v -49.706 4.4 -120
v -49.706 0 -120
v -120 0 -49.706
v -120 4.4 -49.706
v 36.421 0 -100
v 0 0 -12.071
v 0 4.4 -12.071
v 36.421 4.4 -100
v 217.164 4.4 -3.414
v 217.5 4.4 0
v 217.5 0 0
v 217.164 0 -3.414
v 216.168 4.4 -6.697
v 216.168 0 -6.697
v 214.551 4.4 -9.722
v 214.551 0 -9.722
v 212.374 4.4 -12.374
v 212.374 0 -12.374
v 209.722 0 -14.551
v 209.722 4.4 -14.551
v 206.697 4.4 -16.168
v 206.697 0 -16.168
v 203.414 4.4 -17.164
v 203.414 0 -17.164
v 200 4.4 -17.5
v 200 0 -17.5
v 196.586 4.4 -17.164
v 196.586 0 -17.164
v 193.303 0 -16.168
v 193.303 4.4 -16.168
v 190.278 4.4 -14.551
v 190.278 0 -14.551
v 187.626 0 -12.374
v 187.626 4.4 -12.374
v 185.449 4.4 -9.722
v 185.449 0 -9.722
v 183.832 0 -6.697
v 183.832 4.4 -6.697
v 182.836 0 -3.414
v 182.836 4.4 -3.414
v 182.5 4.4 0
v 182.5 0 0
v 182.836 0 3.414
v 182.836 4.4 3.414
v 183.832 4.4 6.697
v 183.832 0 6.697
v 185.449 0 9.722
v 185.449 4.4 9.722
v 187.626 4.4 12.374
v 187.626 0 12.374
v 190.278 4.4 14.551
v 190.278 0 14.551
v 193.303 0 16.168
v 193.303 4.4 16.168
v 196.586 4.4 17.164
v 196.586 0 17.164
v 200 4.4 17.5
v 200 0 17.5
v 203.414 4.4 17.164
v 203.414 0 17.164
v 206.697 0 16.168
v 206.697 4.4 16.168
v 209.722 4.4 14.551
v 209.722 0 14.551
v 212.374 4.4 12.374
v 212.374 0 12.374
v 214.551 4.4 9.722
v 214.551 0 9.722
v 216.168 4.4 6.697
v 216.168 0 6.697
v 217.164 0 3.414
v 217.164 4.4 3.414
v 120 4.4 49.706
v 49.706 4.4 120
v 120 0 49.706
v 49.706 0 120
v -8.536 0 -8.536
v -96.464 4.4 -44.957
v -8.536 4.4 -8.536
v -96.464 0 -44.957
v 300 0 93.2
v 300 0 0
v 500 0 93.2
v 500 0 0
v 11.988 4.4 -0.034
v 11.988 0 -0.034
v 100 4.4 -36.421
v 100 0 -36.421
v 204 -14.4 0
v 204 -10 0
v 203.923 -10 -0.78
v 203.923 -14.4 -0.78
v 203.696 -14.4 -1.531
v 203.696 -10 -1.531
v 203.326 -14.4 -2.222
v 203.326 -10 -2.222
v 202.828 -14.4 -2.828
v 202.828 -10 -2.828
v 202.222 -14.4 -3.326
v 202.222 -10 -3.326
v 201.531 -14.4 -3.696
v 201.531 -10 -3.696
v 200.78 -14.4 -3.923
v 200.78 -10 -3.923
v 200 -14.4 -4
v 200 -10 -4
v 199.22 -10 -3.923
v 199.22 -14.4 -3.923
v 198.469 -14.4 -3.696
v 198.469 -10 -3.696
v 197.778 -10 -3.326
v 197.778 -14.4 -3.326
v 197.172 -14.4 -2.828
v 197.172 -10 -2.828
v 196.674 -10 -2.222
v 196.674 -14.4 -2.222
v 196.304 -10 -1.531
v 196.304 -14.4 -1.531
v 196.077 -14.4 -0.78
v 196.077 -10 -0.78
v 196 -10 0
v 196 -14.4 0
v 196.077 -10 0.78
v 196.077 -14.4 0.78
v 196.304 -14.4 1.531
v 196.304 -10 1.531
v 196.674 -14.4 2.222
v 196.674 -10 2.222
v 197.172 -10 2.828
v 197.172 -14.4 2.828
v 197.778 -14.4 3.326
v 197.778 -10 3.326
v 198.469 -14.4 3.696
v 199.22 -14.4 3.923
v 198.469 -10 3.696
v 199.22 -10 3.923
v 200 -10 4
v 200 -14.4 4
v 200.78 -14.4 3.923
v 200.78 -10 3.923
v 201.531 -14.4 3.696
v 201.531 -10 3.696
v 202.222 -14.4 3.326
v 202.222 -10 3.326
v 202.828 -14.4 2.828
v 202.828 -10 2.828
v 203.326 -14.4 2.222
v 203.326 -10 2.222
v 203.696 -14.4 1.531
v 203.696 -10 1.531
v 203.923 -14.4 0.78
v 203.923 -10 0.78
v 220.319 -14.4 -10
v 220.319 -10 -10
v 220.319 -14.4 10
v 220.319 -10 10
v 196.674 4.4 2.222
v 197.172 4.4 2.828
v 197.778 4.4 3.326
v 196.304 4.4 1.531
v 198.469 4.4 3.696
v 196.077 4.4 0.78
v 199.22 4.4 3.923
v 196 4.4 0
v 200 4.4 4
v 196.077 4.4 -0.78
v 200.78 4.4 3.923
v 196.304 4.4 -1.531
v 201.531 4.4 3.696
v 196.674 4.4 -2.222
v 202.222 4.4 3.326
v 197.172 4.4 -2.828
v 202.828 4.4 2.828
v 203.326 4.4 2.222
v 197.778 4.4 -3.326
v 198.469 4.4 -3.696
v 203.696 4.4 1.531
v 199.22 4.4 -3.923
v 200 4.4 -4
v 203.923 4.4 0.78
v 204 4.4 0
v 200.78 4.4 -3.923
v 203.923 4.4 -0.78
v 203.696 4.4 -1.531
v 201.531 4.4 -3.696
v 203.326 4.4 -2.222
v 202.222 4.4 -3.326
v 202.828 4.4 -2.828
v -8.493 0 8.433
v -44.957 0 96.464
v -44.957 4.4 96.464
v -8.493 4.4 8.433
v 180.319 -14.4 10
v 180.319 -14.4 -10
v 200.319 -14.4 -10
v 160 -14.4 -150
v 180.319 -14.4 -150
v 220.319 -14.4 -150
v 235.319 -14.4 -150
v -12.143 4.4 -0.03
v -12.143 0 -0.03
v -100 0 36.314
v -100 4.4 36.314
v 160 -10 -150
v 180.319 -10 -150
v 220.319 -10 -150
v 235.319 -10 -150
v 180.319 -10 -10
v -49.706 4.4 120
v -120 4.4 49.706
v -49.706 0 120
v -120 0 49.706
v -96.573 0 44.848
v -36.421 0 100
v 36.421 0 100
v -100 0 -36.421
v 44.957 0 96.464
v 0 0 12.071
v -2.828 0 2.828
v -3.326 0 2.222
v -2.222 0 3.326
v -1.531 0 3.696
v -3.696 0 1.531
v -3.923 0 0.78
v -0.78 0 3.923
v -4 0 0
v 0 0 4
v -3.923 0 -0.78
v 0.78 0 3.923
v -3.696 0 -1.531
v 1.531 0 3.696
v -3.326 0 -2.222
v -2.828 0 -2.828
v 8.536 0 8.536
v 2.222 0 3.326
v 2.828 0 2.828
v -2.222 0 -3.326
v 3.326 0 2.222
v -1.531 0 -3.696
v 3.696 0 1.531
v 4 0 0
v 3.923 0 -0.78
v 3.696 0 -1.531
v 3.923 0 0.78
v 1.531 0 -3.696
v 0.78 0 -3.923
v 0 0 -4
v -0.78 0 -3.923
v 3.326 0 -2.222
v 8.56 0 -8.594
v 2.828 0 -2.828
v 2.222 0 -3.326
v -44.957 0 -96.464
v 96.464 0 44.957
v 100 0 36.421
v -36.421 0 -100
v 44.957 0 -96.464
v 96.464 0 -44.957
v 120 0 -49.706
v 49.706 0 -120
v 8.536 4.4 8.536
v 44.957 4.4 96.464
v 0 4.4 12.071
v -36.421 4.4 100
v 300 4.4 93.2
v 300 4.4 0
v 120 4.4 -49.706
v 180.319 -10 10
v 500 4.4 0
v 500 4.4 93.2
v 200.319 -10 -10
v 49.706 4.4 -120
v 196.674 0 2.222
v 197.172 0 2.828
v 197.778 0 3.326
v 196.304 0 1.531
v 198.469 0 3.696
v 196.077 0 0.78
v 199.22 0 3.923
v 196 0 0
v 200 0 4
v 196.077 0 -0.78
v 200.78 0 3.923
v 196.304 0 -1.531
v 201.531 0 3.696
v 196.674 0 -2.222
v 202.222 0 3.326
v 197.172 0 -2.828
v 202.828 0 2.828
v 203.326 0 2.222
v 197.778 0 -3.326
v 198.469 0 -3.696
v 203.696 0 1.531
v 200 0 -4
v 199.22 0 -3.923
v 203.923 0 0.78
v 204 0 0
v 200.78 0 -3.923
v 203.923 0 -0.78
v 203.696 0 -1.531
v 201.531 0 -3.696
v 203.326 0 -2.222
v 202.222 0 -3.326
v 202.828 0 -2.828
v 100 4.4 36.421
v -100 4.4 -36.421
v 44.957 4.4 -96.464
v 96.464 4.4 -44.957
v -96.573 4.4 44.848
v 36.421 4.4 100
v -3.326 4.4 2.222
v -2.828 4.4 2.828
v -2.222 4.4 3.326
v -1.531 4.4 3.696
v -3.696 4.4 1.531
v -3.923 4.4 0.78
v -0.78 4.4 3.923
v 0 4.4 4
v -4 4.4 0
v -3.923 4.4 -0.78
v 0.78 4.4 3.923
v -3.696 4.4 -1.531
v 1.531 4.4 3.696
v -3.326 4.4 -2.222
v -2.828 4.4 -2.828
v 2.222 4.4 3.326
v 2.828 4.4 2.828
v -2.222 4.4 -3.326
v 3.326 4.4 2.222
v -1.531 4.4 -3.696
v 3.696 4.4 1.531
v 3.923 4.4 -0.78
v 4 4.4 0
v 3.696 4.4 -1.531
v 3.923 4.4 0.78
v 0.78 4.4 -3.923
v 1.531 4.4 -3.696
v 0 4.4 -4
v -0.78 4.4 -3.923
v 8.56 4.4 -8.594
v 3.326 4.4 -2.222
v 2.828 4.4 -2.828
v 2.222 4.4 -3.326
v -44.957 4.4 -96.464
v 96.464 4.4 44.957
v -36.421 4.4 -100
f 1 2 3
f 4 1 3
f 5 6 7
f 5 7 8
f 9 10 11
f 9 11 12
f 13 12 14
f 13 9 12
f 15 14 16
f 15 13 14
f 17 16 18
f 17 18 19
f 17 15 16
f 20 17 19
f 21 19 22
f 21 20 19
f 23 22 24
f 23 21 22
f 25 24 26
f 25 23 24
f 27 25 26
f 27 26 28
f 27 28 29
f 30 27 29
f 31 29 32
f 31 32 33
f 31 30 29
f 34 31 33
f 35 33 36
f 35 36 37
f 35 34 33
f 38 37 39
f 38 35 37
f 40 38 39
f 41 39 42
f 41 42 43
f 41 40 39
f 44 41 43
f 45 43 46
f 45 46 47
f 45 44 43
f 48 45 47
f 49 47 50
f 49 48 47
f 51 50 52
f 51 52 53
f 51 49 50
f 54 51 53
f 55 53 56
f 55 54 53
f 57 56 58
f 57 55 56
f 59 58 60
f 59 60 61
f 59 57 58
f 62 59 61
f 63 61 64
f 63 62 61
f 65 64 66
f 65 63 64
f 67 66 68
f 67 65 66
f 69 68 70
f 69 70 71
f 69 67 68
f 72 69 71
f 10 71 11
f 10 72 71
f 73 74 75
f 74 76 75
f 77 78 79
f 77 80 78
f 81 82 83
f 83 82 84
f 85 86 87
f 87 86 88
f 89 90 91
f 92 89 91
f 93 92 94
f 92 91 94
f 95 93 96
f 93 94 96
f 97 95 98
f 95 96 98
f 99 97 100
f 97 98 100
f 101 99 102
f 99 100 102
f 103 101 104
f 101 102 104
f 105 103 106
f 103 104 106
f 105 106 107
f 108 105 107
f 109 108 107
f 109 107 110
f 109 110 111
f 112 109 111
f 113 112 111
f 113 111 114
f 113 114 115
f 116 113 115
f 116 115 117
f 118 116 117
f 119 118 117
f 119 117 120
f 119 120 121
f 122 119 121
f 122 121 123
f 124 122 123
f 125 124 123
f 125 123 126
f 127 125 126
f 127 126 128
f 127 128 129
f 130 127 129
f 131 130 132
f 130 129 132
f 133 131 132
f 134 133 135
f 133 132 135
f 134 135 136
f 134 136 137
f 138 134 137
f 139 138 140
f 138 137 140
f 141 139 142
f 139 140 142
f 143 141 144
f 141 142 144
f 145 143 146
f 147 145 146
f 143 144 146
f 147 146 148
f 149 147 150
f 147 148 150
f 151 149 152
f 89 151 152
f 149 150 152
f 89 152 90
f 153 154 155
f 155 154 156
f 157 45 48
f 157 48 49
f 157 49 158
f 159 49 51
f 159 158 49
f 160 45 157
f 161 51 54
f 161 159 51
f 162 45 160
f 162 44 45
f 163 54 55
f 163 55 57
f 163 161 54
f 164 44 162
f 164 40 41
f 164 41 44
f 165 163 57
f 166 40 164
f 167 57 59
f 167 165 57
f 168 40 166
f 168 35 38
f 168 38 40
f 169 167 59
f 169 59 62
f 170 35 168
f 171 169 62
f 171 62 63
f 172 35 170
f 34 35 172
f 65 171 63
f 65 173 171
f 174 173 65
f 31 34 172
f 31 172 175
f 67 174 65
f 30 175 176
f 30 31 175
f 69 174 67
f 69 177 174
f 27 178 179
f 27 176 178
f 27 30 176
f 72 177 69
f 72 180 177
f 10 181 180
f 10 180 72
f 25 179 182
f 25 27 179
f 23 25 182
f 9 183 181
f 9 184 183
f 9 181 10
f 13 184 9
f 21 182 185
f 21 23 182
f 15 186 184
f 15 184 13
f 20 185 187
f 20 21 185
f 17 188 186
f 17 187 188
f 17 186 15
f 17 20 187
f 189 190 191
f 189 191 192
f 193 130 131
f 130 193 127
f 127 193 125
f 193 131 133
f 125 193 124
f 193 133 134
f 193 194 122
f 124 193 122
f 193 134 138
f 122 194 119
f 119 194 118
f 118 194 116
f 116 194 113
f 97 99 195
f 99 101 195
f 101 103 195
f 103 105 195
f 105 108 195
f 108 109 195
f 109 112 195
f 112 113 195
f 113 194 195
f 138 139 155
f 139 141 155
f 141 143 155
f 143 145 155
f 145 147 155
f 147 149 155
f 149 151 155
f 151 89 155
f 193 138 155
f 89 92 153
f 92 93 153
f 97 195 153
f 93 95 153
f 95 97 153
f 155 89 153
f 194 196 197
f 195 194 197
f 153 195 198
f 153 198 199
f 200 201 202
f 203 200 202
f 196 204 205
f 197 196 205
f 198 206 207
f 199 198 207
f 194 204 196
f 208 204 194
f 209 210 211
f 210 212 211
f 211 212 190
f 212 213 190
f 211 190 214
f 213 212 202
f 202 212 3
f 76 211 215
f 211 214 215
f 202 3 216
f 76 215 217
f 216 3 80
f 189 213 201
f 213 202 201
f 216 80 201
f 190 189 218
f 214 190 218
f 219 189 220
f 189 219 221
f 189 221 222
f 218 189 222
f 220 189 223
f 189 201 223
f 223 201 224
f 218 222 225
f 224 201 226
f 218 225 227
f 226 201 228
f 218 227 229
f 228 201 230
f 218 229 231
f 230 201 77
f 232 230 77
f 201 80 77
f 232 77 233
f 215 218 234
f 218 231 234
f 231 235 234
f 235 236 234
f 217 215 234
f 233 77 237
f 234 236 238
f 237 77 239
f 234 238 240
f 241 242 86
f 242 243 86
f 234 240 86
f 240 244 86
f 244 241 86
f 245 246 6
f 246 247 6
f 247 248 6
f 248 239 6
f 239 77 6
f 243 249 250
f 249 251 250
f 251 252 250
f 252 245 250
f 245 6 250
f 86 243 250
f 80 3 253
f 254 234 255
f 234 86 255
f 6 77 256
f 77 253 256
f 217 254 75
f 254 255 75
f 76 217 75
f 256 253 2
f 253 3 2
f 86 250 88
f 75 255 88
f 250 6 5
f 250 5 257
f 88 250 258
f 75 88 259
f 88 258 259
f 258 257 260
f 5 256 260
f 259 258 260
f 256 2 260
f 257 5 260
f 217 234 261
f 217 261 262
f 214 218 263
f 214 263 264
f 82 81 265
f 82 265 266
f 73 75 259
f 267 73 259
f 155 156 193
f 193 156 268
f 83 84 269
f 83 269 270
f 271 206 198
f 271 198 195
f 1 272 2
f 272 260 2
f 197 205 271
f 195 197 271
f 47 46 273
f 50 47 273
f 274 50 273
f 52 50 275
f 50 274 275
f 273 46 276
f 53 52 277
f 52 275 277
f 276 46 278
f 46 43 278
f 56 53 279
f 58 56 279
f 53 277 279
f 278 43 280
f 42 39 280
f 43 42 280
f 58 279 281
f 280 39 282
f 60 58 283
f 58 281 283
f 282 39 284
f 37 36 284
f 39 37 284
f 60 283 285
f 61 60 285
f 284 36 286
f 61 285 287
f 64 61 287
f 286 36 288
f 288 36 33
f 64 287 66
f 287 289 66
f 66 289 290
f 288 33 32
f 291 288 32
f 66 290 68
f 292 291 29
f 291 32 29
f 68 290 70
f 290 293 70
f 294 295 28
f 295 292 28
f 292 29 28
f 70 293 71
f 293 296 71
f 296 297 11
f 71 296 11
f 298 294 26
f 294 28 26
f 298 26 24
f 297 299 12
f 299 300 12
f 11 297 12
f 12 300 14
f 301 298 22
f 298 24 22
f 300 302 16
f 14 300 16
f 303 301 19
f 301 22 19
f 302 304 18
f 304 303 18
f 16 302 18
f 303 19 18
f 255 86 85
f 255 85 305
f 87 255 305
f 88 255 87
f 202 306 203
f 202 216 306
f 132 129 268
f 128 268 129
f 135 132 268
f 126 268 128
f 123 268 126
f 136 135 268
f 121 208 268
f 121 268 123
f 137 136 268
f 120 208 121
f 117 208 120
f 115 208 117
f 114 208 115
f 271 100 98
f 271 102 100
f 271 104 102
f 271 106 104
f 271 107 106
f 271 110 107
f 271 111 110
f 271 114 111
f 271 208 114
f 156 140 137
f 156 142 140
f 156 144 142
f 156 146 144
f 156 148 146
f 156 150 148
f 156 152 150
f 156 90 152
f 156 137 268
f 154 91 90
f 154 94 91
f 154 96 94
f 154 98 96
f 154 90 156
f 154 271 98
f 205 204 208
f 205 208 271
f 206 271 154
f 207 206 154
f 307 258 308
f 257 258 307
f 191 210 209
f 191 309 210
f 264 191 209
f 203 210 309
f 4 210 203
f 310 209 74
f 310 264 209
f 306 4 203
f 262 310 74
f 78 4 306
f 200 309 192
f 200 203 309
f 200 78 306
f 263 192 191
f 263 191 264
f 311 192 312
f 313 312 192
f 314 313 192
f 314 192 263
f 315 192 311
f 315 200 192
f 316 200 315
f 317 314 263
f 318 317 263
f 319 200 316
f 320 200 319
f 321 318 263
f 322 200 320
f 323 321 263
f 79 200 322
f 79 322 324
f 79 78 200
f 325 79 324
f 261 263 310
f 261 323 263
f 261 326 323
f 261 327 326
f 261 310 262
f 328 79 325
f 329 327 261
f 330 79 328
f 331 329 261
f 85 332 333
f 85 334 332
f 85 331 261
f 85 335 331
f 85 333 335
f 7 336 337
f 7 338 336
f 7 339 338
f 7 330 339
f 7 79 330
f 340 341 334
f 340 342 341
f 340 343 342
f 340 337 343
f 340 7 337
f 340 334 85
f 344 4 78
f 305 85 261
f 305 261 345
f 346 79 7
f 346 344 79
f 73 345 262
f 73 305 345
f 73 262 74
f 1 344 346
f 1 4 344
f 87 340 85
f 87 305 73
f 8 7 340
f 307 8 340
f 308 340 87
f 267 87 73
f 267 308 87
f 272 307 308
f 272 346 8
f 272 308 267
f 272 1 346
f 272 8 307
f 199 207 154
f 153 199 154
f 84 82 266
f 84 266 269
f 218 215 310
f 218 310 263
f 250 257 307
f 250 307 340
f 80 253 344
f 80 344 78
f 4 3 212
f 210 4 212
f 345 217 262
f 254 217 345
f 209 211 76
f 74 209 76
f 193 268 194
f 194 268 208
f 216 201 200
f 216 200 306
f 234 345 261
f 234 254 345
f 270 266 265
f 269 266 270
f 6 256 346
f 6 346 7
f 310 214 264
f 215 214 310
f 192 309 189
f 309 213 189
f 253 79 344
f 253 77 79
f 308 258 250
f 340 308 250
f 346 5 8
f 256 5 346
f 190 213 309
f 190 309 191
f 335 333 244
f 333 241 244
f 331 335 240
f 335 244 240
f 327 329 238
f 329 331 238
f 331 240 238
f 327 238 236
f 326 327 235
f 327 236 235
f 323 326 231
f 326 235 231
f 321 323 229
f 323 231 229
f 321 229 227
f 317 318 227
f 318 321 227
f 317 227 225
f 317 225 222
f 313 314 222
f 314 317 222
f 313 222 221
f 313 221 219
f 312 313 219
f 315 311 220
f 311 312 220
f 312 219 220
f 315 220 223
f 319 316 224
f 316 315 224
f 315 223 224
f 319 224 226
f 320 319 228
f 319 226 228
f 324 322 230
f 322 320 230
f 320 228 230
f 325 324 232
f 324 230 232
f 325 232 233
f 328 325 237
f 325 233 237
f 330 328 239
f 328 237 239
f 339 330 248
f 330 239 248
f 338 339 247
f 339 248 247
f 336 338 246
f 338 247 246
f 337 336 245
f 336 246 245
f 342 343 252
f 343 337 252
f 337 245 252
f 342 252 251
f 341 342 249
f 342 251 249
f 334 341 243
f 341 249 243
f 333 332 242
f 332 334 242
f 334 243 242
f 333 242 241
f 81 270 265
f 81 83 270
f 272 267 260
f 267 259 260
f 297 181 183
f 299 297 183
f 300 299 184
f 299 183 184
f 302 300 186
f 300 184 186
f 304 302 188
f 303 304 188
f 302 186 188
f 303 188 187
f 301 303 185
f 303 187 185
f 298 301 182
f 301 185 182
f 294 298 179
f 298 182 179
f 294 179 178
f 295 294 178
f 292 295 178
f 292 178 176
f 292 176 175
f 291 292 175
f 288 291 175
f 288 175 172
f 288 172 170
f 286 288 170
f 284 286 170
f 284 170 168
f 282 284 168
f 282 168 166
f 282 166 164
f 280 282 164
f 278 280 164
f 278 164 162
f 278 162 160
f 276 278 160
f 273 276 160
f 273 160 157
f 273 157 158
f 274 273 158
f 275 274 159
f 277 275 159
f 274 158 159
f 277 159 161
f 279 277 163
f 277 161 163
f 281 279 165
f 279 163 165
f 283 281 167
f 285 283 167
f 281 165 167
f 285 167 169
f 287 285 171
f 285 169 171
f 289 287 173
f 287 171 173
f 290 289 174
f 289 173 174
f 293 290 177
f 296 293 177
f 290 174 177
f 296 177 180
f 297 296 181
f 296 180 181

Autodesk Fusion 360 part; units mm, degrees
sketch "Sketch1" plane through (0, 0, 0) normal (0, 1, 0) x (1, 0, 0)
  line L0 (100, -41.4214) -> (100, 41.4213)
  line L1 (100, 41.4213) -> (41.4214, 100)
  line L2 (41.4214, 100) -> (-41.4213, 100)
  line L3 (-41.4213, 100) -> (-100, 41.4214)
  line L4 (-100, 41.4214) -> (-100, -41.4213)
  line L5 (-100, -41.4213) -> (-41.4214, -100)
  line L6 (-41.4214, -100) -> (41.4213, -100)
  line L7 (41.4213, -100) -> (100, -41.4214)
  line L8 (-96.5734, -44.848) -> (-100.1089, -41.3124) construction
  line L9 (-100.1089, -41.3124) -> (-100, -36.3136) construction
  line L10 (-41.4214, -100) -> (-36.4214, -100)
  line L11 (-41.4214, -100) -> (-44.9569, -96.4644)
  line L12 (-100, 41.4214) -> (-100, 36.4214)
  line L13 (-100, 41.4214) -> (-96.4644, 44.9569)
  line L14 (-41.4213, 100) -> (-36.4213, 100)
  line L15 (-41.4213, 100) -> (-44.9569, 96.4645)
  line L16 (41.4214, 100) -> (44.9569, 96.4644)
  line L17 (41.4214, 100) -> (36.4214, 100)
  line L18 (100, 41.4213) -> (100, 36.4213)
  line L19 (100, 41.4213) -> (96.4645, 44.9569)
  line L20 (100, -41.4214) -> (100, -36.4214)
  line L21 (100, -41.4214) -> (96.4644, -44.9569)
  line L22 (41.4213, -100) -> (44.9569, -96.4645)
  line L23 (41.4213, -100) -> (36.4213, -100)
  line L24 (-96.5734, -44.848) -> (100, 36.4213)
  line L25 (96.4645, 44.9569) -> (-100, -36.3136)
  line L26 (-44.9569, -96.4644) -> (36.4214, 100)
  line L27 (44.9569, 96.4644) -> (-36.4214, -100)
  line L28 (36.4213, -100) -> (-44.9569, 96.4645)
  line L29 (-36.4213, 100) -> (44.9569, -96.4645)
  line L30 (96.4644, -44.9569) -> (-100, 36.4214)
  line L31 (-96.4644, 44.9569) -> (100, -36.4214)
  circle A0 centre (0, 0) radius 4
  circle A1 centre (0, 0) radius 17.5
  line L32 (120, 49.7056) -> (49.7056, 120)
  line L33 (49.7056, 120) -> (-49.7056, 120)
  line L34 (-49.7056, 120) -> (-120, 49.7056)
  line L35 (-120, 49.7056) -> (-120, -49.7056)
  line L36 (-120, -49.7056) -> (-49.7056, -120)
  line L37 (-49.7056, -120) -> (49.7056, -120)
  line L38 (49.7056, -120) -> (120, -49.7056)
  line L39 (120, -49.7056) -> (120, 49.7056)
  line L40 (200.3187, 0) -> (200.3187, 150) construction
  line L41 (200.3187, 150) -> (220.3187, 150) construction
  line L42 (200.3187, 150) -> (180.3187, 150) construction
  line L43 (220.3187, 150) -> (235.3187, 150)
  line L44 (220.3187, -10) -> (180.3187, -10)
  line L45 (180.3187, -10) -> (180.3187, 10)
  line L46 (220.3187, 10) -> (220.3187, -10)
  line L47 (220.3187, -10) -> (180.3187, 10) construction
  line L48 (180.3187, -10) -> (220.3187, 10) construction
  line L49 (235.3187, 150) -> (220.3187, 10)
  line L50 (220.3187, 150) -> (200.3187, 10)
  line L51 (180.3187, 150) -> (200.3187, 10)
  line L52 (160, 150) -> (180.3187, 10)
  line L53 (160, 150) -> (180.3187, 150)
  line L54 (300, 0) -> (500, 0)
  line L55 (500, 0) -> (500, -93.2)
  line L56 (500, -93.2) -> (300, -93.2)
  line L57 (300, -93.2) -> (300, 0)
  point P0 (200.3187, 0)
  dimension "d5" = 100
  dimension "d6" = 5
  dimension "d7" = 5
  dimension "d10" = 5
  dimension "d11" = 5
  dimension "d12" = 5
  dimension "d13" = 5
  dimension "d14" = 5
  dimension "d15" = 5
  dimension "d16" = 5
  dimension "d17" = 5
  dimension "d18" = 5
  dimension "d19" = 5
  dimension "d20" = 5
  dimension "d21" = 5
  dimension "d22" = 5
  dimension "d23" = 5
  dimension "d25" = 8
  dimension "d26" = 35
  dimension "d28" = 120
  dimension "d42" = 150
  dimension "d43" = 20
  dimension "d44" = 20
  dimension "d45" = 15
  dimension "d46" = 40
  dimension "d47" = 20
  dimension "d48" = 200
  dimension "d49" = 93.2
extrude "Extrude1" add sketch "Sketch1" along normal blind 4.4 contours L0 L7 L20 L21 L30 L31 A1 | L0 L1 L18 L19 L24 L25 A1 | L24 L29 L30 L31 A1 | L6 L7 L22 L23 L28 L29 A1 | L24 L25 L27 L31 A1 | L24 L27 L29 L31 | L27 L28 L29 L30 A1 | L24 L27 L29 L30 | L24 L27 L29 | L25 L27 L29 L31 | L27 L29 L31 | L24 L27 L30 | L24 L27 L28 L30 | L1 L2 L16 L17 L26 L27 A1 | L25 L26 L27 L29 A1 | L24 L25 L26 L27 L28 L29 L30 L31 | L25 L29 L31 | L5 L6 L10 L11 L26 L27 A1 | L24 L26 L27 L28 A1 | L24 L28 L30 | L25 L26 L29 L31 | L25 L26 L31 | L24 L26 L28 L30 | L26 L28 L30 | L26 L28 L29 L31 A1 | L2 L3 L14 L15 L28 L29 A1 | L25 L26 L28 | L25 L26 L28 L31 | L24 L25 L26 L30 A1 | L4 L5 L24 L25 A1 | L25 L26 L28 L30 | L25 L28 L30 L31 A1 | L3 L4 L12 L13 L30 L31 A1 | L32 L33 L34 L35 L36 L37 L38 L39 makes body 1
cylinder "CylinderPrimitive1" add diameter 35 height 4.4 placed x (1, 0, 0) y (0, 0, -1) z (0, 1, 0) at (200, 0, 0) separate body makes body 2
cylinder "CylinderPrimitive2" cut diameter 8 height 5 placed x (1, 0, 0) y (0, 0, -1) z (0, 1, 0) at (200, 0, 0) bodies 2
extrude "Extrude3" add sketch "Sketch1" against normal blind 4.4 from surface at -10 separate body contours L43 L44 L45 L46 L49 L50 L51 L52 L53 makes body 3
extrude "Extrude4" add sketch "Sketch1" along normal blind 4.4 separate body contours L54 L55 L56 L57 makes body 4
cylinder "CylinderPrimitive3" cut diameter 8 height -30 placed x (1, 0, 0) y (0, 0, -1) z (0, 1, 0) at (200, 0, 0) bodies 3
copy_body "Body->Comp1" bodies 1 removing the originals makes body 5 in component "Component"
copy_body "Body->Comp2" bodies 2 removing the originals makes body 6 in component "Component'"
copy_body "Body->Comp3" bodies 3 removing the originals makes body 7 in component "Component''"
copy_body "Body->Comp4" bodies 4 removing the originals makes body 8 in component "Component'''"
component "Component" placed x (1, 0, 0) y (0, 1, 0) z (0, 0, 1) at (0, 0, 0)
component "Component'" placed x (1, 0, 0) y (0, 1, 0) z (0, 0, 1) at (0, 0, 0)
component "Component''" placed x (1, 0, 0) y (0, 1, 0) z (0, 0, 1) at (0, 0, 0)
component "Component'''" placed x (1, 0, 0) y (0, 1, 0) z (0, 0, 1) at (0, 0, 0)
equation "outside_diameter = 100 mm"
equation "number_of_sides = 8"
equation "inner_diameter = 35 mm"
equation "distance_between = 80 mm"
equation "d5 = outside_diameter"
equation "d6 = width_of_sides"
equation "d7 = width_of_sides"
equation "width_of_sides = 5 mm"
equation "d10 = width_of_sides"
equation "d11 = width_of_sides"
equation "d12 = width_of_sides"
equation "d13 = width_of_sides"
equation "d14 = width_of_sides"
equation "d15 = width_of_sides"
equation "d16 = width_of_sides"
equation "d17 = width_of_sides"
equation "d18 = width_of_sides"
equation "d19 = width_of_sides"
equation "d20 = width_of_sides"
equation "d21 = width_of_sides"
equation "d22 = width_of_sides"
equation "d23 = width_of_sides"
equation "rotating_diameter = 8 mm"
equation "d25 = rotating_diameter"
equation "d26 = inner_diameter"
equation "holder_thickness = 20 mm"
equation "d28 = outside_diameter + holder_thickness"
equation "material_thickness = 4.4 mm"
equation "d30 = material_thickness"
equation "d36 = material_thickness"
equation "d37 = inner_diameter"
equation "d40 = rotating_diameter"
equation "height = 150 mm"
equation "d42 = height"
equation "d43 = holder_thickness"
equation "d44 = holder_thickness"
equation "d45 = width_of_sides * 3"
equation "d46 = holder_thickness * 2"
equation "d47 = holder_thickness"
equation "d48 = outside_diameter * 2"
equation "d49 = material_thickness * 3 + distance_between"
equation "d51 = -material_thickness"
equation "d53 = material_thickness"
equation "d57 = rotating_diameter"
